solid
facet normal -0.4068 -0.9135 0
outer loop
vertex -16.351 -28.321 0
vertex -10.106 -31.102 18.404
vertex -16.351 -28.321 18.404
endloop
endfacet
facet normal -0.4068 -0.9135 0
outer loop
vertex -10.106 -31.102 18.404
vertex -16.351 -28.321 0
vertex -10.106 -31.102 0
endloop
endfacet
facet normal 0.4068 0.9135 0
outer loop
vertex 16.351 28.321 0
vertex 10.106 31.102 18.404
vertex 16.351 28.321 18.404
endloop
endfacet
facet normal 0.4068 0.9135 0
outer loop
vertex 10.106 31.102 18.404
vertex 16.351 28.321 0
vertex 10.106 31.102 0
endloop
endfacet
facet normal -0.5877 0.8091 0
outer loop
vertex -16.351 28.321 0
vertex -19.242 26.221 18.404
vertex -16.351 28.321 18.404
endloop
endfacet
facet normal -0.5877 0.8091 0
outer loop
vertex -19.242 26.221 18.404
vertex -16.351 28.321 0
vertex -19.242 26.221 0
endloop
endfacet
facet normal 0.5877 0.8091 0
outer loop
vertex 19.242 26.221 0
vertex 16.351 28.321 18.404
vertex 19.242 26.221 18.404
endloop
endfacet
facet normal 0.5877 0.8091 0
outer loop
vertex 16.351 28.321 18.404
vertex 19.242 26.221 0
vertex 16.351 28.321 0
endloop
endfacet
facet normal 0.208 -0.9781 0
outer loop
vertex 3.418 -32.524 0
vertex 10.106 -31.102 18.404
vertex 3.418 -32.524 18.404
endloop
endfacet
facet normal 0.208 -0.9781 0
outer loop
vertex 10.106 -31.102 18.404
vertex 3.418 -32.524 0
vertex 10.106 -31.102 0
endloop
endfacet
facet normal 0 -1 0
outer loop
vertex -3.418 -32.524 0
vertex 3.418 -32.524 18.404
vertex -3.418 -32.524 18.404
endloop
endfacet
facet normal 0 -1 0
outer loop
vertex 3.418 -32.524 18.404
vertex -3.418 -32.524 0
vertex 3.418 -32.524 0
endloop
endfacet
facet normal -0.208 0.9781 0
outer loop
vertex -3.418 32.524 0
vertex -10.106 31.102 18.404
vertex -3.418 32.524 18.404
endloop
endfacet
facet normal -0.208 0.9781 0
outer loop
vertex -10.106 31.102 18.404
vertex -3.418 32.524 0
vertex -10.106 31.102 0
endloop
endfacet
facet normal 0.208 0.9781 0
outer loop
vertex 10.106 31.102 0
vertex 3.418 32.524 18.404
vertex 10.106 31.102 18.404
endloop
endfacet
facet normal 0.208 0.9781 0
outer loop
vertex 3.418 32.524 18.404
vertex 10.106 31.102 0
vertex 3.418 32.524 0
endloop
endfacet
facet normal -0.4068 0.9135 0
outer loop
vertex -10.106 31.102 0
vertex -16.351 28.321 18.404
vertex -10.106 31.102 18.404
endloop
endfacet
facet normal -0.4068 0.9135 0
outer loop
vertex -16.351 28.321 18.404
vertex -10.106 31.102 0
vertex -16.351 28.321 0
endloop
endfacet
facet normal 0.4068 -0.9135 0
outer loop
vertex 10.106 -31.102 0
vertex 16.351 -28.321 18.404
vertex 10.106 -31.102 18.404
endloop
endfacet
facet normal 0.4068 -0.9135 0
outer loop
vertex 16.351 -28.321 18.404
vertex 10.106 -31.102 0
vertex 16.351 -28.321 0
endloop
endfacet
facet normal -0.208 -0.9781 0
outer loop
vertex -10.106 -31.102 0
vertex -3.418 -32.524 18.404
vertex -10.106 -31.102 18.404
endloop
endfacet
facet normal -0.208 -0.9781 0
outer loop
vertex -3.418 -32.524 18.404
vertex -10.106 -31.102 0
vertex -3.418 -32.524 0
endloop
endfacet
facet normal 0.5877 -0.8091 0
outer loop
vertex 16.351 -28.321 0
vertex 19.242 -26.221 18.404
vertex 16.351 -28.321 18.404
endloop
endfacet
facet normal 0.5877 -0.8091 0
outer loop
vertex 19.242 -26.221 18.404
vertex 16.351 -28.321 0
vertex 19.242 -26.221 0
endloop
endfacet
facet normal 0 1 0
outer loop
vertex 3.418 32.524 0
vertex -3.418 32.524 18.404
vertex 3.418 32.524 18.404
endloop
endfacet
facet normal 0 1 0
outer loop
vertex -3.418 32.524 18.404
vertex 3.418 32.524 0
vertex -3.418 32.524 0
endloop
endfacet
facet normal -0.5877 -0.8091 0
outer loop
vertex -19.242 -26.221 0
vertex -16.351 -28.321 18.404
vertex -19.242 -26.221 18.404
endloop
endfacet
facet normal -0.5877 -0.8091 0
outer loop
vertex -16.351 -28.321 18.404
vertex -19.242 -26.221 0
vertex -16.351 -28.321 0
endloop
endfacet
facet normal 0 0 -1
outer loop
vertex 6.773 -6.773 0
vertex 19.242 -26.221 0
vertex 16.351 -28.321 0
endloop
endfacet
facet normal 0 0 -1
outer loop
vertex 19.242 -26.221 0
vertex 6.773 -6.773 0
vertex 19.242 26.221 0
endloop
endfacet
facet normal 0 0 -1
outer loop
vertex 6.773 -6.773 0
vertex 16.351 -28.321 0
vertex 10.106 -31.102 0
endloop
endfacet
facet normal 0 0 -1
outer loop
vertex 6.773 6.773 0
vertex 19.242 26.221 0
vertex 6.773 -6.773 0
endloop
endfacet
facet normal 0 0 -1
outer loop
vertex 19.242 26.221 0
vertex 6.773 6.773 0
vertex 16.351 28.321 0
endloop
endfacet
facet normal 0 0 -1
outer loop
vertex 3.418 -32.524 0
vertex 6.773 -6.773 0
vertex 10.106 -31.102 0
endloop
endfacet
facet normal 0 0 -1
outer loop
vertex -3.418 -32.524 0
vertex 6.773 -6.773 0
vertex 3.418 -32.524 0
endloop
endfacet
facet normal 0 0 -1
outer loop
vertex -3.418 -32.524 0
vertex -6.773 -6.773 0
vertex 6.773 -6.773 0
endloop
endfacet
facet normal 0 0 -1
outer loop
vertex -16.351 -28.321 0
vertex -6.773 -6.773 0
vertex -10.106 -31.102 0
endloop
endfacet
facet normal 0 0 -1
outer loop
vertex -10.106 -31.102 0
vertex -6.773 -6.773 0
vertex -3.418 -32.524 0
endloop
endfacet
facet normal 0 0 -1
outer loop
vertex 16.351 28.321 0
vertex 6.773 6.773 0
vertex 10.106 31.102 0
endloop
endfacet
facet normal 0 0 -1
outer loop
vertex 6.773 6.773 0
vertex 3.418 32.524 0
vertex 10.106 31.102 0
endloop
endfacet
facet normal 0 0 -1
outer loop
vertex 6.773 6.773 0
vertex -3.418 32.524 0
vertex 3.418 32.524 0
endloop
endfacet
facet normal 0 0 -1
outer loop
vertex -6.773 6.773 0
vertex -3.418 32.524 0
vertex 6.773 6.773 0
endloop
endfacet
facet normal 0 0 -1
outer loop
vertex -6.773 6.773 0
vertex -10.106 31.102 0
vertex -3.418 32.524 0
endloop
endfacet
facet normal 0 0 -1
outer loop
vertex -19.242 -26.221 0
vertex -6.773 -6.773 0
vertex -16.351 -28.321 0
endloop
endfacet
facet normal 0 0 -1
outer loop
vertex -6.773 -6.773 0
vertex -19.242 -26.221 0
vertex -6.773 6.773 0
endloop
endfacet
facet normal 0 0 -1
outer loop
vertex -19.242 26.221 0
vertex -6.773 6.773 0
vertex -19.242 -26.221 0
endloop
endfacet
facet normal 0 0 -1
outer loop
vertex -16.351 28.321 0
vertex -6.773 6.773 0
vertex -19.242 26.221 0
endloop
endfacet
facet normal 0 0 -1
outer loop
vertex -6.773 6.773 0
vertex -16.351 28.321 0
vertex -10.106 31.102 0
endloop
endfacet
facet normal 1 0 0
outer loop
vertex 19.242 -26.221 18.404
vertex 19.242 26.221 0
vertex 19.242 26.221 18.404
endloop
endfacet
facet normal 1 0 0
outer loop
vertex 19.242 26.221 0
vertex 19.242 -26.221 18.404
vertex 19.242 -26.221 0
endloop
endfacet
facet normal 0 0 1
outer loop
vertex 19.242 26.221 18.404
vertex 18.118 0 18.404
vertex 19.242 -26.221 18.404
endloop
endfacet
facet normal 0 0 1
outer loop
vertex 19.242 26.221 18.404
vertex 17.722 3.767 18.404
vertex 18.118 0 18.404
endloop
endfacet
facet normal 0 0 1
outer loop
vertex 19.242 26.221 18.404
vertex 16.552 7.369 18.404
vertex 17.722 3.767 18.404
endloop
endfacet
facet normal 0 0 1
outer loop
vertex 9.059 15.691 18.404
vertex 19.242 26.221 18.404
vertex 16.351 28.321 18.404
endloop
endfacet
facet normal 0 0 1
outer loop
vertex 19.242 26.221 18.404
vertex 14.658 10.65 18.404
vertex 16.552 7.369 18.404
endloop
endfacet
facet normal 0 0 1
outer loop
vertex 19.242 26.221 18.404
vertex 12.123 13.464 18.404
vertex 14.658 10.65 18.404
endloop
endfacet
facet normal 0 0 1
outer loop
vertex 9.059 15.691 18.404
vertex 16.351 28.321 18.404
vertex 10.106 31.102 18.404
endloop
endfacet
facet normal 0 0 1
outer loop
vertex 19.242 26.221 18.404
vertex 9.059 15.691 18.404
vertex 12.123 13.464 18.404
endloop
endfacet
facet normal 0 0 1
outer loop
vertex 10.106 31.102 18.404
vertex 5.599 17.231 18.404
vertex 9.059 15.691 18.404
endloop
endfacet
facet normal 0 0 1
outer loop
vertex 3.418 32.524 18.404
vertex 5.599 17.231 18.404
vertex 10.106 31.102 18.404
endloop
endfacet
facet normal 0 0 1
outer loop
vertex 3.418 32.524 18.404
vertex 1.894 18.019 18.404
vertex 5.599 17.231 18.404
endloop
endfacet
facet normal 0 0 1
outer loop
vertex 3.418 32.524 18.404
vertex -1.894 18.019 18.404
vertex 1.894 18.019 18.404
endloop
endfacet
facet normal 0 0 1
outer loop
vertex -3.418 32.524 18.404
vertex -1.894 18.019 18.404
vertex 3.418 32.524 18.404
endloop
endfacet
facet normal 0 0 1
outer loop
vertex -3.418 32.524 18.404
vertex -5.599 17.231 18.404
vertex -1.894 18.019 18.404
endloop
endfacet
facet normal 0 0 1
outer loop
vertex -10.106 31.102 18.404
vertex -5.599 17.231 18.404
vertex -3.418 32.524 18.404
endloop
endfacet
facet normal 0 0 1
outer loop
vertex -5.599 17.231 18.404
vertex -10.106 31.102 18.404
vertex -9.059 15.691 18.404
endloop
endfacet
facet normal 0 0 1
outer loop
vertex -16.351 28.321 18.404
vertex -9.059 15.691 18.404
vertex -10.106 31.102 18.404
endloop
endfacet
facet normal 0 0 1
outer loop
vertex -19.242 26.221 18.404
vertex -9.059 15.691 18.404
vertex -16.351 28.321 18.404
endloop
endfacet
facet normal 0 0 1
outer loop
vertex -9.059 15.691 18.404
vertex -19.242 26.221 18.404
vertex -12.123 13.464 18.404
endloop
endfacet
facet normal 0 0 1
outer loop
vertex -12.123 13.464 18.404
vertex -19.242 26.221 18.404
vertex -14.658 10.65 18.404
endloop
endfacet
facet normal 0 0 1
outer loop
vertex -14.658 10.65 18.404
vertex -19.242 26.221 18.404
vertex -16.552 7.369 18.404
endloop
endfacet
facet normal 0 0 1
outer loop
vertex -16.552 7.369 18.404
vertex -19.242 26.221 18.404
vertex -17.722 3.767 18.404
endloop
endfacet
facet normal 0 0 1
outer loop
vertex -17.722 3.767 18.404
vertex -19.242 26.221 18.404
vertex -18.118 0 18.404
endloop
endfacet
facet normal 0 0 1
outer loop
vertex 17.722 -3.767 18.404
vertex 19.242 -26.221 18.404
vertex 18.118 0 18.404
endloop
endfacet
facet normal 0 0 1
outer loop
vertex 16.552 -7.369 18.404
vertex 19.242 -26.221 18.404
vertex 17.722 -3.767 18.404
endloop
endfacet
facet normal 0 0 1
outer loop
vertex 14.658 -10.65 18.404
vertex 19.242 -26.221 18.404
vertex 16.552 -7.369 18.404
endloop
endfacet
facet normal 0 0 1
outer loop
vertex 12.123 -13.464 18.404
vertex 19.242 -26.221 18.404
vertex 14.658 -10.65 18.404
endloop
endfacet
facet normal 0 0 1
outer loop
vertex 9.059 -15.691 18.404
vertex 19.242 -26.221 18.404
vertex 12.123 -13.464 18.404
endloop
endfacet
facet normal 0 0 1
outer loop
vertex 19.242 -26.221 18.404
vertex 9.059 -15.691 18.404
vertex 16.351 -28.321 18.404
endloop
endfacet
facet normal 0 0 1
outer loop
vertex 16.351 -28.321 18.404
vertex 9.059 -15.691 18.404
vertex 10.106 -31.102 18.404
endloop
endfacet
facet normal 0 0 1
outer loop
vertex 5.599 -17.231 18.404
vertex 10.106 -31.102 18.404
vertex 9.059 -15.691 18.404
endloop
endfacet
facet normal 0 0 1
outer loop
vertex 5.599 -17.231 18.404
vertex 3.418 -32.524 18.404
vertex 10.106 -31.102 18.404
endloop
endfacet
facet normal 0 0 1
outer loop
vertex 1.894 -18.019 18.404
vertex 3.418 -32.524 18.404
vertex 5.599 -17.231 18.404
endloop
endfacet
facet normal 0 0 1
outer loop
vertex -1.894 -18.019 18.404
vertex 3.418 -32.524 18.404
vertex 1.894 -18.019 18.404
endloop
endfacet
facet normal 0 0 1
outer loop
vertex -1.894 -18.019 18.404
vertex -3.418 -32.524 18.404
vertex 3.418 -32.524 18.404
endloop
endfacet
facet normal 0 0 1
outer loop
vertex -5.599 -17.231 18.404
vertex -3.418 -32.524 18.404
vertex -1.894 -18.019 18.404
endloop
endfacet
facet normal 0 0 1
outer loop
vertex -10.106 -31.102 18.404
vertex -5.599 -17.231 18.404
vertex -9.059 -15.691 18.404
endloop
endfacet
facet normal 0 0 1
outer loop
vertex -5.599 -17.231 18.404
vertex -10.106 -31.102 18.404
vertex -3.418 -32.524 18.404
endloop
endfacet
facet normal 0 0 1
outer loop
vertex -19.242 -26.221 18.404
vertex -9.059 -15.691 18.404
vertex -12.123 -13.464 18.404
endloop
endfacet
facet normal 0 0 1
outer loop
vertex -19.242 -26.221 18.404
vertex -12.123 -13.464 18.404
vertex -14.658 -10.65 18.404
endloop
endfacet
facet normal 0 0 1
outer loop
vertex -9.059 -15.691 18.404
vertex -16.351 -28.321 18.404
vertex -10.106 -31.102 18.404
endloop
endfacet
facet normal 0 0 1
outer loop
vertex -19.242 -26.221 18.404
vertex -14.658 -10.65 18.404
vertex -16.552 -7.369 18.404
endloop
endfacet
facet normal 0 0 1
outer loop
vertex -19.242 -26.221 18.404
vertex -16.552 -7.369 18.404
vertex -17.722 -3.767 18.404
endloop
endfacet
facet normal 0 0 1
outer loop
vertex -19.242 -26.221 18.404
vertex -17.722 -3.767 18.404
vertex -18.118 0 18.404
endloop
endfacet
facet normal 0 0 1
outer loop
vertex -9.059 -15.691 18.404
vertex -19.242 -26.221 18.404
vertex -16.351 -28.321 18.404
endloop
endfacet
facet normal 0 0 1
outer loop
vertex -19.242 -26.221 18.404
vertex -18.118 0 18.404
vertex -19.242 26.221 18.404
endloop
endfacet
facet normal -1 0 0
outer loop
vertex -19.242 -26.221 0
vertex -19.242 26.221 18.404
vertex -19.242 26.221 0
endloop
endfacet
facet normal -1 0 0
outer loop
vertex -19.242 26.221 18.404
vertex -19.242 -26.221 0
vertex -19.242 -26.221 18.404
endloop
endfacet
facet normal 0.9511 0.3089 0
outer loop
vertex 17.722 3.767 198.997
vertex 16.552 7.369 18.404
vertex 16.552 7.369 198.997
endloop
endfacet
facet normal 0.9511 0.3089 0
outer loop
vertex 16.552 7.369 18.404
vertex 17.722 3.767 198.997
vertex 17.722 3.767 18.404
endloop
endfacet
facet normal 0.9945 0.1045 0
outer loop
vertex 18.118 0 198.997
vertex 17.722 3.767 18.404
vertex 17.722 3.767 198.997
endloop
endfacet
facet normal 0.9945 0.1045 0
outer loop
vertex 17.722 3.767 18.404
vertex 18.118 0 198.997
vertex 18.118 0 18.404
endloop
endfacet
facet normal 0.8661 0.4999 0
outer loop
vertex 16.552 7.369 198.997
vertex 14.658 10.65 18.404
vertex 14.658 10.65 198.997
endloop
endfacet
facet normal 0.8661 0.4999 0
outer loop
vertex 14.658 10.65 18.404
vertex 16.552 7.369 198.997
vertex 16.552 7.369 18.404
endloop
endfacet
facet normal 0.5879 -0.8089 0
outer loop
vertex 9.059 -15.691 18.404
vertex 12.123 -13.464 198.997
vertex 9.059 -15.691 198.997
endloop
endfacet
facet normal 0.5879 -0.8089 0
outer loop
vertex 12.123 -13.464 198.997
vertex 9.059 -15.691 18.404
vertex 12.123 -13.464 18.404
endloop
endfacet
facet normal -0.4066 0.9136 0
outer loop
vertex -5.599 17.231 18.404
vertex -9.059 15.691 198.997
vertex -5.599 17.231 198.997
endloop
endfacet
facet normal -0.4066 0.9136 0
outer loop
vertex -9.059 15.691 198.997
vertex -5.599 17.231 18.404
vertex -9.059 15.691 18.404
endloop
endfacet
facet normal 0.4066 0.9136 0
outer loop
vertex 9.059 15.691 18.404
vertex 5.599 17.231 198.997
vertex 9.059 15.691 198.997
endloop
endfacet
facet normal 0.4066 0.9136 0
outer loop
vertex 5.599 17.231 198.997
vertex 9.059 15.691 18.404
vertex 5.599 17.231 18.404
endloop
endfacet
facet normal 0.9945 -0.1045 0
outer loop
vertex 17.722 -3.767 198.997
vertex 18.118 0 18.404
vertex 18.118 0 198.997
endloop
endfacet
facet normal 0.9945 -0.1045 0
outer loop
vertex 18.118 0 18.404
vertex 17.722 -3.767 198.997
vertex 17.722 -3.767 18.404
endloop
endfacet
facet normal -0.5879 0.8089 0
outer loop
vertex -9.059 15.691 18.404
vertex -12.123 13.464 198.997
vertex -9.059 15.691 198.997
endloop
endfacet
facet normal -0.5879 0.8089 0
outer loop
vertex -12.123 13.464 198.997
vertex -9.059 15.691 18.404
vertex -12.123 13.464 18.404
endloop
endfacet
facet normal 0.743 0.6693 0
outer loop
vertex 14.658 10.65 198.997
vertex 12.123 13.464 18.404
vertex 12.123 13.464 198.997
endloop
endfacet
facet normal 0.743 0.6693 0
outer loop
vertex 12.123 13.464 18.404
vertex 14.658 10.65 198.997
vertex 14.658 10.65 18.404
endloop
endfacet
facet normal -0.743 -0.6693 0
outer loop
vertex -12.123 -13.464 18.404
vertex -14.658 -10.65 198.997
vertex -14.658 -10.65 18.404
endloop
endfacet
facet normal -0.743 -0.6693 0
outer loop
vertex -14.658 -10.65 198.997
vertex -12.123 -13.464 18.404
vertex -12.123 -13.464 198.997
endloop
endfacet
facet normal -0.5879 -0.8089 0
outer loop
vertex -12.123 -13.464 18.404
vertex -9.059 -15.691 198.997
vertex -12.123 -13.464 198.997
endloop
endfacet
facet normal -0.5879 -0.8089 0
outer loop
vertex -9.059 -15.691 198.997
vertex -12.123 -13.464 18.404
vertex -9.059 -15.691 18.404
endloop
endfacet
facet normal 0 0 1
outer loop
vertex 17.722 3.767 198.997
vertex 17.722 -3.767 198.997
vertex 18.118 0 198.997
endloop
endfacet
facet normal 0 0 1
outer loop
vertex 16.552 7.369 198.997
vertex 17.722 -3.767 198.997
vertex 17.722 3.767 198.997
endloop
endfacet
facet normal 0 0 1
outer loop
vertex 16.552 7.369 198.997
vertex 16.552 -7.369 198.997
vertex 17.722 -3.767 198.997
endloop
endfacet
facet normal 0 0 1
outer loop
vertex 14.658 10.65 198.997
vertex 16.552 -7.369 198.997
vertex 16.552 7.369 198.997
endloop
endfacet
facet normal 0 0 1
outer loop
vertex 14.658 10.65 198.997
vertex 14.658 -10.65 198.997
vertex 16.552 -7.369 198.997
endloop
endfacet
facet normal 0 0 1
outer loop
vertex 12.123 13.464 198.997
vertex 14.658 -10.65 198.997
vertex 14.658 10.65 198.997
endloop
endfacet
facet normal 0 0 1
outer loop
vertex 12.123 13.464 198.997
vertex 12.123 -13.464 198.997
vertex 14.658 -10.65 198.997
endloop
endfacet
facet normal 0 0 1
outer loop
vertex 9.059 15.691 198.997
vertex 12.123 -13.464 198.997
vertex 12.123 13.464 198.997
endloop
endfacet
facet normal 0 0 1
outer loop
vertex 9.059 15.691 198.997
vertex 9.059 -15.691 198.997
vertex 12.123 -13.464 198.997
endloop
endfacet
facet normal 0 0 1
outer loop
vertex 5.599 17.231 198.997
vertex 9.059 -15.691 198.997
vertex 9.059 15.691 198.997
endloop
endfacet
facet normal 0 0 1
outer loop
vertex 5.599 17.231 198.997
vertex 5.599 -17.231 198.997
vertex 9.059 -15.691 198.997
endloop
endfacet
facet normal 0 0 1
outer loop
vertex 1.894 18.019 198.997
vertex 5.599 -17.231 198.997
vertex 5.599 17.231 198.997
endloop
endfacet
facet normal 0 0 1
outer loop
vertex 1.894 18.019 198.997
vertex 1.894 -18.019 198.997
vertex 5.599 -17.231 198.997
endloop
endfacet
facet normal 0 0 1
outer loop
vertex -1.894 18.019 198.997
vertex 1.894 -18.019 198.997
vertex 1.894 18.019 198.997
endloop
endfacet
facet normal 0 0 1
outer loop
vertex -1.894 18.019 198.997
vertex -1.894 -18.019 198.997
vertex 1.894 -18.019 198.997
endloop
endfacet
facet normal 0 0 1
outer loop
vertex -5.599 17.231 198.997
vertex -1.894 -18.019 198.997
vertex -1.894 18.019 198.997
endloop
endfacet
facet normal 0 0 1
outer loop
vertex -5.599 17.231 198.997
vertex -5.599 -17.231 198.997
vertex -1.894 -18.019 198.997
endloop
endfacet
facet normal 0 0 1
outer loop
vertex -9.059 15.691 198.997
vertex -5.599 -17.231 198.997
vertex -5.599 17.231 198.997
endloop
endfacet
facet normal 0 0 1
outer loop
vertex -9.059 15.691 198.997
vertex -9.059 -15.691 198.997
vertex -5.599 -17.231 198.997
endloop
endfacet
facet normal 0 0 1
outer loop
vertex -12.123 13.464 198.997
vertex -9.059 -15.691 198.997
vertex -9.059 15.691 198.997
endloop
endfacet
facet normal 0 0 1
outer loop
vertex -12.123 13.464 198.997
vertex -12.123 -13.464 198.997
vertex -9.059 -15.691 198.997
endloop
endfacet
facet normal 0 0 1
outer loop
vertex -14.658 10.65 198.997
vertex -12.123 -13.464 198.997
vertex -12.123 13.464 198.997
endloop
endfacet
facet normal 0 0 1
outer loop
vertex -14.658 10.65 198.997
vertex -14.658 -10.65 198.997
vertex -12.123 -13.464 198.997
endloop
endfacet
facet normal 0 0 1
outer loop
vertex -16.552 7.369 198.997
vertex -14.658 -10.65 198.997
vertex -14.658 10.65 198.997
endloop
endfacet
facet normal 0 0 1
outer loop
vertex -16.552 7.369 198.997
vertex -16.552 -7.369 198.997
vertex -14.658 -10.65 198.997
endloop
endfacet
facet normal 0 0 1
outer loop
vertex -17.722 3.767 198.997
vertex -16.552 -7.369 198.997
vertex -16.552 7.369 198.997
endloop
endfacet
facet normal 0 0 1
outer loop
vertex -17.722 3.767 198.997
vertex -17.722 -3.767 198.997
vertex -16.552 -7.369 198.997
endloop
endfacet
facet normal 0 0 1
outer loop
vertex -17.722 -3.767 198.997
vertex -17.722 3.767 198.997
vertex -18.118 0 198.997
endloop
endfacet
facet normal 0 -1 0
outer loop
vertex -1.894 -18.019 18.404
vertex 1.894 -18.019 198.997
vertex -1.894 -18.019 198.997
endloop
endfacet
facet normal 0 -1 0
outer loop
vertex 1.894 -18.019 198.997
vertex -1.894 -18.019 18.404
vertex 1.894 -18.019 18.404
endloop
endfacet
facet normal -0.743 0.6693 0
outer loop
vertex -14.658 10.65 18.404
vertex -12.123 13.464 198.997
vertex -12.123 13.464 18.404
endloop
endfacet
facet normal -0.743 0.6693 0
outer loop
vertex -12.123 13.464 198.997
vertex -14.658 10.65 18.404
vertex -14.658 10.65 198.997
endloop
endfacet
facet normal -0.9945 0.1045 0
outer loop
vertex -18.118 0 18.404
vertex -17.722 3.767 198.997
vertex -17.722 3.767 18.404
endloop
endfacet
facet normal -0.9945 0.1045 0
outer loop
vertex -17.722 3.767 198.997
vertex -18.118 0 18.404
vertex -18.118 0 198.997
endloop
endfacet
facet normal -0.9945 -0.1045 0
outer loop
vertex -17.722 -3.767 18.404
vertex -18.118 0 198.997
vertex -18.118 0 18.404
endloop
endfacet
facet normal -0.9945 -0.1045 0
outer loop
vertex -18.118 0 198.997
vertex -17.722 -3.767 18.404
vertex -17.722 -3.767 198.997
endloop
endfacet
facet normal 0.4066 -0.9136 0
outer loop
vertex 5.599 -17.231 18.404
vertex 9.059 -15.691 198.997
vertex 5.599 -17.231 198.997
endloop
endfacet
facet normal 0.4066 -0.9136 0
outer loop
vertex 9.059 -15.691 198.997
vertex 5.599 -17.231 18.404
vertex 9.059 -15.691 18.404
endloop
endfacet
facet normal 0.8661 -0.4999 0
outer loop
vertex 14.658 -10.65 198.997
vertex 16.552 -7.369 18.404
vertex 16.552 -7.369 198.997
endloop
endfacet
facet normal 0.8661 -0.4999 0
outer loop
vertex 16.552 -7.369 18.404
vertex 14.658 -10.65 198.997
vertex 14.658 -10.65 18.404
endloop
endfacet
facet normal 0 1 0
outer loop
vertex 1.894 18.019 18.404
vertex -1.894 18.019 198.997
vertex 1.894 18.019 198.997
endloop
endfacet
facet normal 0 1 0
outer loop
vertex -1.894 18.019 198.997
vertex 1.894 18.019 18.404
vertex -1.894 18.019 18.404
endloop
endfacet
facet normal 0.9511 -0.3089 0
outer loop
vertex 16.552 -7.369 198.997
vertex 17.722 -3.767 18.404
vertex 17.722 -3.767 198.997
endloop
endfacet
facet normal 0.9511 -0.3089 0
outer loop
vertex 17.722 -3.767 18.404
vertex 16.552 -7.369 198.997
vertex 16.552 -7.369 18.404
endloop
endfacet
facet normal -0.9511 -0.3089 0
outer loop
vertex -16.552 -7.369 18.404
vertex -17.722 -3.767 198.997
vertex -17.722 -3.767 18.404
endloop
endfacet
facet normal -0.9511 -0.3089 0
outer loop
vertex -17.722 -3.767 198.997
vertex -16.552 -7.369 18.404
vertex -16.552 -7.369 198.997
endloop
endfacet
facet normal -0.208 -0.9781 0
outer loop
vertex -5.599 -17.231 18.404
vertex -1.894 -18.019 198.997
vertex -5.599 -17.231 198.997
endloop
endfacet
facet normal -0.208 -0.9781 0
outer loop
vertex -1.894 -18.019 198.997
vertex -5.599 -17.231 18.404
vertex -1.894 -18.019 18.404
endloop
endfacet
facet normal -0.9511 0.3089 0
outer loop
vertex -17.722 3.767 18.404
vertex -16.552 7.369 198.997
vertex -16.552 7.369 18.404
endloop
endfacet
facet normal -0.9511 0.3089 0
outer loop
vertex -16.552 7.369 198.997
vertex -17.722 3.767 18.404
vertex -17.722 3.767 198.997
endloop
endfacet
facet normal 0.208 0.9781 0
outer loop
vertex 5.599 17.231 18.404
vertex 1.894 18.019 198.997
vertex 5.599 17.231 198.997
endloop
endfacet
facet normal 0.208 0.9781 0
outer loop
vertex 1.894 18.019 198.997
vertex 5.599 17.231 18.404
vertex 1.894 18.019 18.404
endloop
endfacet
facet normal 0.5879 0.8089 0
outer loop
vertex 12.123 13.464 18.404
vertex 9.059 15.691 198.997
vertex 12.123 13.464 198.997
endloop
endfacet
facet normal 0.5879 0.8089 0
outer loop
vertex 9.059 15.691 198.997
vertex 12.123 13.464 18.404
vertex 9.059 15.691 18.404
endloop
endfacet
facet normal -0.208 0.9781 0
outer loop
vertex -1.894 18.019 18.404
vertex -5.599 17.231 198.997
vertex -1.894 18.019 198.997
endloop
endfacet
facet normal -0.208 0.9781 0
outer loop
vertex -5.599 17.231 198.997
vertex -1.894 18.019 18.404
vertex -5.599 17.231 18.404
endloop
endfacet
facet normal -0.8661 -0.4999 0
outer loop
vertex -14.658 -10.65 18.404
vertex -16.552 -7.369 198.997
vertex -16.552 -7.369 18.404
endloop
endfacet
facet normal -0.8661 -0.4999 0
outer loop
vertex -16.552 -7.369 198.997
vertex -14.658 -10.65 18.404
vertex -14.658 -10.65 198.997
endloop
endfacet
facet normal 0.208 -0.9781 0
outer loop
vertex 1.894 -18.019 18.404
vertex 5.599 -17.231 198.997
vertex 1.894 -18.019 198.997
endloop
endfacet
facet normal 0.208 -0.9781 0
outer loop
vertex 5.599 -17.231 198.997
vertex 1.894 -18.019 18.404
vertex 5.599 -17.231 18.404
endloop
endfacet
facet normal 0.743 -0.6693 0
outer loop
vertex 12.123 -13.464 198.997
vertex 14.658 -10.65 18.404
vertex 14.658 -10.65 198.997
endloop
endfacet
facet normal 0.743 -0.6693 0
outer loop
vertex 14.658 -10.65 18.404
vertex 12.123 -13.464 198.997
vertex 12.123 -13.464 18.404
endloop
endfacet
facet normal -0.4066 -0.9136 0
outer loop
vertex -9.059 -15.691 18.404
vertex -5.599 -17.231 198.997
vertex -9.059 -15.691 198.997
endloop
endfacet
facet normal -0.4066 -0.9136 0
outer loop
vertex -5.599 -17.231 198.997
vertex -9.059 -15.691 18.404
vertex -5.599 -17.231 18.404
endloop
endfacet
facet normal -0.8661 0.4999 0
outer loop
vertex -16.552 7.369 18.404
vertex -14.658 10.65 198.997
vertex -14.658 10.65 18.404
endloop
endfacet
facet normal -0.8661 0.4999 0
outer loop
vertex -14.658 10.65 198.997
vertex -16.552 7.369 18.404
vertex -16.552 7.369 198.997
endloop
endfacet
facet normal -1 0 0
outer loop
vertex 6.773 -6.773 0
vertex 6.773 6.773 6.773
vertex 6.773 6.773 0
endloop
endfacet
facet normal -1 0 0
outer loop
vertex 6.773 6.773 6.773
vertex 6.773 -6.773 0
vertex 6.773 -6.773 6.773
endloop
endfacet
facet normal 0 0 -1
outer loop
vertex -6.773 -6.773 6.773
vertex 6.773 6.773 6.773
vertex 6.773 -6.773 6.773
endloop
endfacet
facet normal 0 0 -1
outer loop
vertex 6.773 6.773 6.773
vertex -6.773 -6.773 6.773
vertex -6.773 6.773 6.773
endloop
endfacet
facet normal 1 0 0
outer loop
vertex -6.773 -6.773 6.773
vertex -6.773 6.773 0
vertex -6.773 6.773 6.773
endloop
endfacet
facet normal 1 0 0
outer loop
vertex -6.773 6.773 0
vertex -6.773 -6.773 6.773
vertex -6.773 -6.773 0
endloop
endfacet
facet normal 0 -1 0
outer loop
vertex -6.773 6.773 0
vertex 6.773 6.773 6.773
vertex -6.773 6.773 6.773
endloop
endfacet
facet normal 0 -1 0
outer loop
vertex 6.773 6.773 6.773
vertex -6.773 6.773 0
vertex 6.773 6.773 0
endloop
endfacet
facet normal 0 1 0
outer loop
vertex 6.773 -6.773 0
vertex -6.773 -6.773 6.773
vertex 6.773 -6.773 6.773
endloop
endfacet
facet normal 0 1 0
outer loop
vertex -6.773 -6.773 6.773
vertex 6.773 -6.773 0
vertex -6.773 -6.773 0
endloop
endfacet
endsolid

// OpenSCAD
seed = 16;
seeds = rands(0,1000000,10,seed);
head_size = rands(25,50,1,seeds[1])[0];
head_radius = rands(25,50,1,seeds[2])[0];
bolt_length = rands(head_size*2,200,1,seeds[3])[0];
bolt_radius = rands(head_size/3, head_size/2,1,seeds[0])[0];
cube_size = rands(bolt_radius*2, head_radius*1.6,1, seeds[4])[0];
hole_size = rands(cube_size/4, cube_size/2,1,seeds[5])[0];


difference(){
    union(){
        intersection(){
            cylinder(head_size,head_radius,head_radius);
            cube([cube_size,head_radius*2,head_size], center=true);
        }
        cylinder(bolt_length,bolt_radius,bolt_radius);
    }
    cube(hole_size, true);
}
